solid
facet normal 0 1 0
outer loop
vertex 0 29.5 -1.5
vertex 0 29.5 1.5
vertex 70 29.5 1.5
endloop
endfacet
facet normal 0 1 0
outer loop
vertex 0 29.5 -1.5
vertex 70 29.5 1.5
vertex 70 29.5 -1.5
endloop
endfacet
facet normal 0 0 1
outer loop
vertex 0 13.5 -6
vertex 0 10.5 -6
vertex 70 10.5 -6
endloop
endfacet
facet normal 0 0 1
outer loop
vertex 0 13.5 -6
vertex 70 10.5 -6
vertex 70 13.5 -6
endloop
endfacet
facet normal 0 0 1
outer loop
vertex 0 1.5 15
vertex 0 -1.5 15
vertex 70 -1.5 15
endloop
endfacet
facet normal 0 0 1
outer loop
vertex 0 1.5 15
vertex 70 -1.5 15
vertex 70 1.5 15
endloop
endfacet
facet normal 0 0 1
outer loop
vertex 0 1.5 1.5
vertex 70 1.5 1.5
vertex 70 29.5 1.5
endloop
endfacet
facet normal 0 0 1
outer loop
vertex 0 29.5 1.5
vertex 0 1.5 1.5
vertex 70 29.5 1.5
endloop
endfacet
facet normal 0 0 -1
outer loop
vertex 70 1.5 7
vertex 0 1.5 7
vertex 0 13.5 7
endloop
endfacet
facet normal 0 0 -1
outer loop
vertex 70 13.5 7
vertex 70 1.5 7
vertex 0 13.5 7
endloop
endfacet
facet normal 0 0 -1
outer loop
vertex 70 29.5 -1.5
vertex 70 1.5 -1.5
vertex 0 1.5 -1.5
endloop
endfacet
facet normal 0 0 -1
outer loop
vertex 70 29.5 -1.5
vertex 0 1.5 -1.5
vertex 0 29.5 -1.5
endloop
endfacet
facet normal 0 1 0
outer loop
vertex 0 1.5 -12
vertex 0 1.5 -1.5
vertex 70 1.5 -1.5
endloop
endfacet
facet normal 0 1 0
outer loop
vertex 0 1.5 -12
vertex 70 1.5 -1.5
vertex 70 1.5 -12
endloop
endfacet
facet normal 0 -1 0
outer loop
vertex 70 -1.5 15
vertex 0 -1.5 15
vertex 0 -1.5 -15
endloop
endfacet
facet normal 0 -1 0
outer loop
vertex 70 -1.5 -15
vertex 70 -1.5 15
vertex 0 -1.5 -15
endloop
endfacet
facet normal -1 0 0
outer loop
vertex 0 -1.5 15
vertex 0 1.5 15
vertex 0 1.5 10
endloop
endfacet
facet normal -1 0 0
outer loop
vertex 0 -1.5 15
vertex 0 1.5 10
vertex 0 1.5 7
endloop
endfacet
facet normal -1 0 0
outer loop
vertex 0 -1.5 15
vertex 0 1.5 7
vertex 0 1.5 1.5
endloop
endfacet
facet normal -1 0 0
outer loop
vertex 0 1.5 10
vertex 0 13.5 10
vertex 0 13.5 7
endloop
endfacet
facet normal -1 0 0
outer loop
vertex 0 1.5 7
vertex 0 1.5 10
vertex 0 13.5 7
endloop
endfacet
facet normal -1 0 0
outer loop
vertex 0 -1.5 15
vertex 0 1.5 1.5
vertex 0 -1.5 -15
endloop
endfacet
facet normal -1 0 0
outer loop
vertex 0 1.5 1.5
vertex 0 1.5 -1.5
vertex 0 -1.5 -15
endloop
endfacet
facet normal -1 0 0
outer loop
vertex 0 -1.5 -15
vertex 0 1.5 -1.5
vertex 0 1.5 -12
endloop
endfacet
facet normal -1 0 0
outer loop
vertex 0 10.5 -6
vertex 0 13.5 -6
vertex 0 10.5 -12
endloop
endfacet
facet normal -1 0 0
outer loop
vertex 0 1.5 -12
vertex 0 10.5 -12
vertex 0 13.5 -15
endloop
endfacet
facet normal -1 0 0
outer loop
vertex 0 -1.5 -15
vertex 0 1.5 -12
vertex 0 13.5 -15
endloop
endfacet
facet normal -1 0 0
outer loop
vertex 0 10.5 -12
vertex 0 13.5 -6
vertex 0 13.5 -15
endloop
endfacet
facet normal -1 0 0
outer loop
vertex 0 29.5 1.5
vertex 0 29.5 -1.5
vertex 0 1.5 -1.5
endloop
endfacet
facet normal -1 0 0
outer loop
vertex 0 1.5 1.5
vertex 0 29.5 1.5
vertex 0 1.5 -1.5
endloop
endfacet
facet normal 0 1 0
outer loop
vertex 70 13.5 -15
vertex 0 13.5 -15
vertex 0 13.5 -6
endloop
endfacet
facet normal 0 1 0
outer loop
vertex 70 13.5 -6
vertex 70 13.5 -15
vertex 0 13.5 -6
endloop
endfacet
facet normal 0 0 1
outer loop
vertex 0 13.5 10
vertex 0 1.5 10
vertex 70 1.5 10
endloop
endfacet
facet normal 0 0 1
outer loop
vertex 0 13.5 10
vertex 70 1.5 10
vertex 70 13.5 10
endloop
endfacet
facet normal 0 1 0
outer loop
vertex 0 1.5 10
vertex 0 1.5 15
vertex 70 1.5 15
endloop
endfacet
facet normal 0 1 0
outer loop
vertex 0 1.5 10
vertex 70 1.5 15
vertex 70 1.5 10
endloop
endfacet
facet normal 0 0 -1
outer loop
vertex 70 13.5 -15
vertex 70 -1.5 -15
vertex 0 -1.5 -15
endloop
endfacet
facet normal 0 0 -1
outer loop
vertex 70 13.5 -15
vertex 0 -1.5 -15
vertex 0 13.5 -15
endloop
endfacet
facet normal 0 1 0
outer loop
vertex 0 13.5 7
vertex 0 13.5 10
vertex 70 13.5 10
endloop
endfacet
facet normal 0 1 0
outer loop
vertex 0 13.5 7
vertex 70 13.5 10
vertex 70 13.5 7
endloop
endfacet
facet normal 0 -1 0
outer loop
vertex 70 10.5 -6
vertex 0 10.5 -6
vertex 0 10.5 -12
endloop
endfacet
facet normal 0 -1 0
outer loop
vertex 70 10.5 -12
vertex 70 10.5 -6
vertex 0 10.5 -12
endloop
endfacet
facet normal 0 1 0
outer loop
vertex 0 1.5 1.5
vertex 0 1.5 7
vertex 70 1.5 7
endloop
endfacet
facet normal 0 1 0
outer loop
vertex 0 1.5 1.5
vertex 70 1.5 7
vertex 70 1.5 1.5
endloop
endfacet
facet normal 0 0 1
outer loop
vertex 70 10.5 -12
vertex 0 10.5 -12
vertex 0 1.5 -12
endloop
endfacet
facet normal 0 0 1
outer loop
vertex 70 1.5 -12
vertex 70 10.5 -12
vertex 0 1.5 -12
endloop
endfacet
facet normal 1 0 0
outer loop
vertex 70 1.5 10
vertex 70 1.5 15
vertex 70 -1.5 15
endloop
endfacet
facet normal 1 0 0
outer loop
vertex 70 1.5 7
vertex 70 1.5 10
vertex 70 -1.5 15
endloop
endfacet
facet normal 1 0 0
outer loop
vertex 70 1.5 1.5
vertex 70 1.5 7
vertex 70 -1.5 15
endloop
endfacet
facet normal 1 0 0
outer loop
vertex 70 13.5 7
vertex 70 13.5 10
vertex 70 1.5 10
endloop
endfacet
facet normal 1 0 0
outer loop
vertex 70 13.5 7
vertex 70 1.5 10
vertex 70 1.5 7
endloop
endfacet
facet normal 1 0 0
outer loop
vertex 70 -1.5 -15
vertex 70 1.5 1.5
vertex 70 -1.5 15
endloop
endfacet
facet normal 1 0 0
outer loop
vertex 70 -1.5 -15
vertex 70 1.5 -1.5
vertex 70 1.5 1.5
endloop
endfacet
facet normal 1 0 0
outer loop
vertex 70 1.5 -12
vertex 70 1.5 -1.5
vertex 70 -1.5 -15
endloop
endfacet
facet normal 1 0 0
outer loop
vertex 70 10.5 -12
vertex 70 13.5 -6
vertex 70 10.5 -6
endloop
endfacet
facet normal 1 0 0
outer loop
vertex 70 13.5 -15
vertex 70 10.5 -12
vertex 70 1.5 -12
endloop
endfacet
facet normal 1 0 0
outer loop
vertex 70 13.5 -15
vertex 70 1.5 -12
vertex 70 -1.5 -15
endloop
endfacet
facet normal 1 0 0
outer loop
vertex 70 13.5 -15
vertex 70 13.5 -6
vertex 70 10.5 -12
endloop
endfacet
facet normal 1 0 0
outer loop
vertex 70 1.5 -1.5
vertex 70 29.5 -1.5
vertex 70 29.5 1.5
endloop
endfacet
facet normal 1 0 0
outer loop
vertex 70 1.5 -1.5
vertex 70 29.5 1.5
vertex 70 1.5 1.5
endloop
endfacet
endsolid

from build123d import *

# Parameters (mm, degrees)
EXTRUDE_1_DEPTH = 70


with BuildPart() as part:
    # Эскиз1 → Бобышка-Вытянуть1 (new body)
    with BuildSketch(Plane(origin=(0, 0, 0), x_dir=(0, 0, -1), z_dir=(1, 0, 0))):
        Polygon((6, 10.5), (12, 10.5), (12, 1.5), (1.5, 1.5), (1.5, 29.5), (-1.5, 29.5), (-1.5, 1.5), (-7, 1.5), (-7, 13.5), (-10, 13.5), (-10, 1.5), (-15, 1.5), (-15, -1.5), (15, -1.5), (15, 13.5), (6, 13.5), align=None)
    extrude(amount=EXTRUDE_1_DEPTH)


solid = part.part
